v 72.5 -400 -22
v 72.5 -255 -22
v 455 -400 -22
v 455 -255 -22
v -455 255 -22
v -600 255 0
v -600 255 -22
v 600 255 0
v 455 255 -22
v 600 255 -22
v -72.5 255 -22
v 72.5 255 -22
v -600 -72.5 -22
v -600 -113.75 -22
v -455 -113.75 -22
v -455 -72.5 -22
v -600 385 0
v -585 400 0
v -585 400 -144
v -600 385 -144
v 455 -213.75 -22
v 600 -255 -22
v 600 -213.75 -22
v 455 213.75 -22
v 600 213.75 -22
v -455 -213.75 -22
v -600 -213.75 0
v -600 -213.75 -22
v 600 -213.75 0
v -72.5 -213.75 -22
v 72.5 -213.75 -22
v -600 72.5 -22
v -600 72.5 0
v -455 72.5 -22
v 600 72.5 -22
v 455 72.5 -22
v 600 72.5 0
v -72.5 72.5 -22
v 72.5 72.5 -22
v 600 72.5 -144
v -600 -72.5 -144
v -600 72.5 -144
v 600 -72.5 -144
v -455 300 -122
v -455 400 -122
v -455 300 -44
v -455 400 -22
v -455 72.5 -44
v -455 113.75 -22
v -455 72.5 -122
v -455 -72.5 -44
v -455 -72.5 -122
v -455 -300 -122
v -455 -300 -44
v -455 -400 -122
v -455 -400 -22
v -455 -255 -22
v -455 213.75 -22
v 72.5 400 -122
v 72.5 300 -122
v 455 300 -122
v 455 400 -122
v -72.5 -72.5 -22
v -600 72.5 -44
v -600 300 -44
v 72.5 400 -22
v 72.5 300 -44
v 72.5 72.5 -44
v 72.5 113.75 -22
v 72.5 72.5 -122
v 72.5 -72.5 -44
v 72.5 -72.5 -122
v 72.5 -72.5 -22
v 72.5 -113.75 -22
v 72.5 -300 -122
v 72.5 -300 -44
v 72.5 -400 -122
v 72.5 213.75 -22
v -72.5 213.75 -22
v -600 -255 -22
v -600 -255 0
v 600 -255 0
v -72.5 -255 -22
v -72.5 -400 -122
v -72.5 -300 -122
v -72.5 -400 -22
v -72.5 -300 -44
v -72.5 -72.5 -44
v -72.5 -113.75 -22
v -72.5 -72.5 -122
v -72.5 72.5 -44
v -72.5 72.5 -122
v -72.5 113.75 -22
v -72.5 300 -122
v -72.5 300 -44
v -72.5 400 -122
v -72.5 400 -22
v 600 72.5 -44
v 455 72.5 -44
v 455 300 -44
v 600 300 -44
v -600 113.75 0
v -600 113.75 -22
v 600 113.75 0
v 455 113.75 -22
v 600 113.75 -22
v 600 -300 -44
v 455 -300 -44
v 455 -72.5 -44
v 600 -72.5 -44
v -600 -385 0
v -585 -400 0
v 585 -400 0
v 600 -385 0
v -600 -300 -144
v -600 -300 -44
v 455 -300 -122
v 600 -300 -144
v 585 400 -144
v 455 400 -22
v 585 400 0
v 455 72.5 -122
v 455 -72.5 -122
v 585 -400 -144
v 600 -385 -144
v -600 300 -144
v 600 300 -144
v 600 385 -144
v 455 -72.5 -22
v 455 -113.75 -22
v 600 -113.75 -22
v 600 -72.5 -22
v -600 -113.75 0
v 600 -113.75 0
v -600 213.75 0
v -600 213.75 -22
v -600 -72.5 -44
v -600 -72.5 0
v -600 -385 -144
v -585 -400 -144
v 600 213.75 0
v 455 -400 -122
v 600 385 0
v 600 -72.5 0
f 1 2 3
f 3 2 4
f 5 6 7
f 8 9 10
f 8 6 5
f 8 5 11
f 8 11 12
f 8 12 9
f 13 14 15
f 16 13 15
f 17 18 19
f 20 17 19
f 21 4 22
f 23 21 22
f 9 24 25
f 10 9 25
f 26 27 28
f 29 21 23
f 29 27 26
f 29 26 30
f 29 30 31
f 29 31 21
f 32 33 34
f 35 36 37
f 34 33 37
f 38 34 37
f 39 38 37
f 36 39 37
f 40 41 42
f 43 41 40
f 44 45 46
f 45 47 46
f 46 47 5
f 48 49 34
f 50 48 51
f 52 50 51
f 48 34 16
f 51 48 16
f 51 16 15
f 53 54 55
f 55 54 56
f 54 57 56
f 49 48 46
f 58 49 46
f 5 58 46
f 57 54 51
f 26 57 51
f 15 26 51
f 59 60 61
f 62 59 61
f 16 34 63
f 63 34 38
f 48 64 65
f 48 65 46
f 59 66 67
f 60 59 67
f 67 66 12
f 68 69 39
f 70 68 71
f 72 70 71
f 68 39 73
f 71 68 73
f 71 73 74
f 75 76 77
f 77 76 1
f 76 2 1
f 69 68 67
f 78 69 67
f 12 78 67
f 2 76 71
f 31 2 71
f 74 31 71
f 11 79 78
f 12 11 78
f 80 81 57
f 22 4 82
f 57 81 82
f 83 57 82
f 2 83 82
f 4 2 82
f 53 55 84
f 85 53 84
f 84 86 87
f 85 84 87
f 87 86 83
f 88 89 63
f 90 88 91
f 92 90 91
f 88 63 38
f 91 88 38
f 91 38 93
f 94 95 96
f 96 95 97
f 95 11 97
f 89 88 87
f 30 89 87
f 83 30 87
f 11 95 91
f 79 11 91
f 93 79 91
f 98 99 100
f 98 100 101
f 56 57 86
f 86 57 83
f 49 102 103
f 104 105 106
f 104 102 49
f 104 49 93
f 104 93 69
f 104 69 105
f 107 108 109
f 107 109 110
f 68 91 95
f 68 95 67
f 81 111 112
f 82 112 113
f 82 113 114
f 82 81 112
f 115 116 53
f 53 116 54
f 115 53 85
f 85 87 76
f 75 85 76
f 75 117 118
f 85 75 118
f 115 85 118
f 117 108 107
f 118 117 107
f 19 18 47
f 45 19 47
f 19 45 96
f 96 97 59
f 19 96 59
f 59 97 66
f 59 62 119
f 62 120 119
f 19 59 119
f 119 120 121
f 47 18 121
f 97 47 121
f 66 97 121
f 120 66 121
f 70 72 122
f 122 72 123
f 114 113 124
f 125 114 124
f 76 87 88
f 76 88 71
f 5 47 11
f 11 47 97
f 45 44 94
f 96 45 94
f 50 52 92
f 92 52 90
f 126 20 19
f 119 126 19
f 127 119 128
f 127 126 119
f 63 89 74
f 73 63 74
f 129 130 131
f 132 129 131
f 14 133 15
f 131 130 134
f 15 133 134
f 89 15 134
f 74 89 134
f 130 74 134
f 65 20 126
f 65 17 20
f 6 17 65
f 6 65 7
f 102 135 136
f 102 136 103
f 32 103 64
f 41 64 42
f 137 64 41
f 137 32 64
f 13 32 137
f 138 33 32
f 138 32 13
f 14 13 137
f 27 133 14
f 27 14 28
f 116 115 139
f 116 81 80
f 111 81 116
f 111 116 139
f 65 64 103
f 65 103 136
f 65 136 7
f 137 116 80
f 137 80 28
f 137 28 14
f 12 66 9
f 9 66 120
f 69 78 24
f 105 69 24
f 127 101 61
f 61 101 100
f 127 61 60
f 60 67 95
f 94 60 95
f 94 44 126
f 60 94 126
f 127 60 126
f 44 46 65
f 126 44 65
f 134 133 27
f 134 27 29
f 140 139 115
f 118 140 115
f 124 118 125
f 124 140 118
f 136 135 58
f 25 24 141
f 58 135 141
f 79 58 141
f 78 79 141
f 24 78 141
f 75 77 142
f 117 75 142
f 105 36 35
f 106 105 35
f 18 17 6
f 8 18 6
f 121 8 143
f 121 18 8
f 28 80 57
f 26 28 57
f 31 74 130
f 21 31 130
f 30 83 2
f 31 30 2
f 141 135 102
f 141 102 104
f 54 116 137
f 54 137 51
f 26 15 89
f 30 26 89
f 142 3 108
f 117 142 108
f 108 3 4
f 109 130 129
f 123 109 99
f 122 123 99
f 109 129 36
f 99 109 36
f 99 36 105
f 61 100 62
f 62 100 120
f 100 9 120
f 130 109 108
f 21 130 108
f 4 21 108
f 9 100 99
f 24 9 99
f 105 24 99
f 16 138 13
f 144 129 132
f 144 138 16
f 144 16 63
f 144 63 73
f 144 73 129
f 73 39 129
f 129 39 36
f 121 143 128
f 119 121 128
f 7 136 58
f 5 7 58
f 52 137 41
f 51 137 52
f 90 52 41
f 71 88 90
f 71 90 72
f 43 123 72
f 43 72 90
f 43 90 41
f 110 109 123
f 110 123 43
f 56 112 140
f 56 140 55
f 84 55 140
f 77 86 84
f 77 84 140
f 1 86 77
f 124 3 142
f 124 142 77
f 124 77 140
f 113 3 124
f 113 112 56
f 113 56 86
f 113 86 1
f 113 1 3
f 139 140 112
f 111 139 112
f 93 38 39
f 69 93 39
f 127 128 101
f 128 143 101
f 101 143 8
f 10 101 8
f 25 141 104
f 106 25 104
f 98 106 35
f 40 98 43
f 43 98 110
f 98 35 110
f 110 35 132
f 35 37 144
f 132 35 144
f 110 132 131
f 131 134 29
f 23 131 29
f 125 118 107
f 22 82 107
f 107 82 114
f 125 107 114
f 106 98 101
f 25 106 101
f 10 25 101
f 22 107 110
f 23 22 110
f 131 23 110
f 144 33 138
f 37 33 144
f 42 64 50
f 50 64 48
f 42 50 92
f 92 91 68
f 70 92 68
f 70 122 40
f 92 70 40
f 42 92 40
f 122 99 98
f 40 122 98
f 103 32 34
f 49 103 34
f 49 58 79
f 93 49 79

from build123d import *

# Parameters (mm, degrees)
F0_W     = 1200
F0_H     = 145
F1_DEPTH = 22
F0_H_2   = 100
F2_W     = 145
F2_H     = 655
F2_H_2   = 145
F3_DEPTH = 22
F4_W     = 145
F4_H     = 100
F4_H_2   = 145
F5_W     = 145
F5_H     = 145
F5_H_2   = 100
F6_DEPTH = 78
F7_W     = 145
F7_H     = 100
F7_W_2   = 1055
F7_W_3   = 1200
F7_H_2   = 145
F8_DEPTH = 22
F9_SIZE  = 15


# Not quite as in the source:
# - a feature names something its author has since deleted; it is built from what else it names


with BuildPart() as f1:
    # F0 (on Top) → F1 (new body)
    with BuildSketch(Plane.XY):
        with Locations((0, 327.5)):
            Rectangle(F0_W, F0_H)
    extrude(amount=-F1_DEPTH)



with BuildPart() as f1b:
    # F0 (on Top) → F1, piece 2 (new body)
    with BuildSketch(Plane.XY):
        with Locations((0, 163.75)):
            Rectangle(F0_W, F0_H_2)
    extrude(amount=-F1_DEPTH)


with BuildPart() as f1c:
    # F0 (on Top) → F1, piece 3 (new body)
    with BuildSketch(Plane.XY):
        Rectangle(F0_W, F0_H)
    extrude(amount=-F1_DEPTH)


with BuildPart() as f1d:
    # F0 (on Top) → F1, piece 4 (new body)
    with BuildSketch(Plane.XY):
        with Locations((0, -163.75)):
            Rectangle(F0_W, F0_H_2)
    extrude(amount=-F1_DEPTH)


with BuildPart() as f1e:
    # F0 (on Top) → F1, piece 5 (new body)
    with BuildSketch(Plane.XY):
        with Locations((0, -327.5)):
            Rectangle(F0_W, F0_H)
    extrude(amount=-F1_DEPTH)


with BuildPart() as f1_1:
    add(f1.part)

    add(f1b.part)  # F3 merges F1b

    add(f1c.part)  # F3 merges F1c

    add(f1d.part)  # F3 merges F1d

    add(f1e.part)  # F3 merges F1e
    # F2 (on face) → F3 (join)
    with BuildSketch(Plane(origin=(0, 0, -22), x_dir=(1, 0, 0), z_dir=(0, 0, -1))):
        with Locations((-527.5, -72.5)):
            Rectangle(F2_W, F2_H)
        with Locations((-527.5, 327.5)):
            Rectangle(F2_W, F2_H_2)
        with Locations((0, 327.5)):
            Rectangle(F2_W, F2_H_2)
        with Locations((0, -72.5)):
            Rectangle(F2_W, F2_H)
        with Locations((527.5, 327.5)):
            Rectangle(F2_W, F2_H_2)
        with Locations((527.5, -72.5)):
            Rectangle(F2_W, F2_H)
    extrude(amount=F3_DEPTH)

    # F4 (on face) + F5 (on face) → F6 (join)
    with BuildSketch(Plane(origin=(0, 0, -44), x_dir=(1, 0, 0), z_dir=(0, 0, -1))):
        with Locations((-527.5, -350)):
            Rectangle(F4_W, F4_H)
        with Locations((-527.5, 350)):
            Rectangle(F4_W, F4_H)
        with Locations((527.5, -350)):
            Rectangle(F4_W, F4_H)
        with Locations((527.5, 0)):
            Rectangle(F4_W, F4_H_2)
        with Locations((527.5, 350)):
            Rectangle(F4_W, F4_H)
        with Locations((-527.5, 0)):
            Rectangle(F4_W, F4_H_2)
    with BuildSketch(Plane(origin=(0, 0, -44), x_dir=(1, 0, 0), z_dir=(0, 0, -1))):
        Rectangle(F5_W, F5_H)
        with Locations((0, 350)):
            Rectangle(F5_W, F5_H_2)
        with Locations((0, -350)):
            Rectangle(F5_W, F5_H_2)
    extrude(amount=F6_DEPTH)

    # F7 (on face) → F8 (join)
    with BuildSketch(Plane(origin=(0, 0, -122), x_dir=(1, 0, 0), z_dir=(0, 0, -1))):
        with Locations((-527.5, -350)):
            Rectangle(F7_W, F7_H)
        with Locations((72.5, -350)):
            Rectangle(F7_W_2, F7_H)
        Rectangle(F7_W_3, F7_H_2)
        with Locations((0, 350)):
            Rectangle(F7_W_3, F7_H)
    extrude(amount=F8_DEPTH)

    # F9
    f9_edges = [f1_1.edges().sort_by_distance(p)[0] for p in [
        (-600, -400, -72),
        (600, -400, -72),
        (600, 400, -72),
        (-600, 400, -72),
    ]]
    chamfer(f9_edges, length=F9_SIZE)


solid = f1_1.part
